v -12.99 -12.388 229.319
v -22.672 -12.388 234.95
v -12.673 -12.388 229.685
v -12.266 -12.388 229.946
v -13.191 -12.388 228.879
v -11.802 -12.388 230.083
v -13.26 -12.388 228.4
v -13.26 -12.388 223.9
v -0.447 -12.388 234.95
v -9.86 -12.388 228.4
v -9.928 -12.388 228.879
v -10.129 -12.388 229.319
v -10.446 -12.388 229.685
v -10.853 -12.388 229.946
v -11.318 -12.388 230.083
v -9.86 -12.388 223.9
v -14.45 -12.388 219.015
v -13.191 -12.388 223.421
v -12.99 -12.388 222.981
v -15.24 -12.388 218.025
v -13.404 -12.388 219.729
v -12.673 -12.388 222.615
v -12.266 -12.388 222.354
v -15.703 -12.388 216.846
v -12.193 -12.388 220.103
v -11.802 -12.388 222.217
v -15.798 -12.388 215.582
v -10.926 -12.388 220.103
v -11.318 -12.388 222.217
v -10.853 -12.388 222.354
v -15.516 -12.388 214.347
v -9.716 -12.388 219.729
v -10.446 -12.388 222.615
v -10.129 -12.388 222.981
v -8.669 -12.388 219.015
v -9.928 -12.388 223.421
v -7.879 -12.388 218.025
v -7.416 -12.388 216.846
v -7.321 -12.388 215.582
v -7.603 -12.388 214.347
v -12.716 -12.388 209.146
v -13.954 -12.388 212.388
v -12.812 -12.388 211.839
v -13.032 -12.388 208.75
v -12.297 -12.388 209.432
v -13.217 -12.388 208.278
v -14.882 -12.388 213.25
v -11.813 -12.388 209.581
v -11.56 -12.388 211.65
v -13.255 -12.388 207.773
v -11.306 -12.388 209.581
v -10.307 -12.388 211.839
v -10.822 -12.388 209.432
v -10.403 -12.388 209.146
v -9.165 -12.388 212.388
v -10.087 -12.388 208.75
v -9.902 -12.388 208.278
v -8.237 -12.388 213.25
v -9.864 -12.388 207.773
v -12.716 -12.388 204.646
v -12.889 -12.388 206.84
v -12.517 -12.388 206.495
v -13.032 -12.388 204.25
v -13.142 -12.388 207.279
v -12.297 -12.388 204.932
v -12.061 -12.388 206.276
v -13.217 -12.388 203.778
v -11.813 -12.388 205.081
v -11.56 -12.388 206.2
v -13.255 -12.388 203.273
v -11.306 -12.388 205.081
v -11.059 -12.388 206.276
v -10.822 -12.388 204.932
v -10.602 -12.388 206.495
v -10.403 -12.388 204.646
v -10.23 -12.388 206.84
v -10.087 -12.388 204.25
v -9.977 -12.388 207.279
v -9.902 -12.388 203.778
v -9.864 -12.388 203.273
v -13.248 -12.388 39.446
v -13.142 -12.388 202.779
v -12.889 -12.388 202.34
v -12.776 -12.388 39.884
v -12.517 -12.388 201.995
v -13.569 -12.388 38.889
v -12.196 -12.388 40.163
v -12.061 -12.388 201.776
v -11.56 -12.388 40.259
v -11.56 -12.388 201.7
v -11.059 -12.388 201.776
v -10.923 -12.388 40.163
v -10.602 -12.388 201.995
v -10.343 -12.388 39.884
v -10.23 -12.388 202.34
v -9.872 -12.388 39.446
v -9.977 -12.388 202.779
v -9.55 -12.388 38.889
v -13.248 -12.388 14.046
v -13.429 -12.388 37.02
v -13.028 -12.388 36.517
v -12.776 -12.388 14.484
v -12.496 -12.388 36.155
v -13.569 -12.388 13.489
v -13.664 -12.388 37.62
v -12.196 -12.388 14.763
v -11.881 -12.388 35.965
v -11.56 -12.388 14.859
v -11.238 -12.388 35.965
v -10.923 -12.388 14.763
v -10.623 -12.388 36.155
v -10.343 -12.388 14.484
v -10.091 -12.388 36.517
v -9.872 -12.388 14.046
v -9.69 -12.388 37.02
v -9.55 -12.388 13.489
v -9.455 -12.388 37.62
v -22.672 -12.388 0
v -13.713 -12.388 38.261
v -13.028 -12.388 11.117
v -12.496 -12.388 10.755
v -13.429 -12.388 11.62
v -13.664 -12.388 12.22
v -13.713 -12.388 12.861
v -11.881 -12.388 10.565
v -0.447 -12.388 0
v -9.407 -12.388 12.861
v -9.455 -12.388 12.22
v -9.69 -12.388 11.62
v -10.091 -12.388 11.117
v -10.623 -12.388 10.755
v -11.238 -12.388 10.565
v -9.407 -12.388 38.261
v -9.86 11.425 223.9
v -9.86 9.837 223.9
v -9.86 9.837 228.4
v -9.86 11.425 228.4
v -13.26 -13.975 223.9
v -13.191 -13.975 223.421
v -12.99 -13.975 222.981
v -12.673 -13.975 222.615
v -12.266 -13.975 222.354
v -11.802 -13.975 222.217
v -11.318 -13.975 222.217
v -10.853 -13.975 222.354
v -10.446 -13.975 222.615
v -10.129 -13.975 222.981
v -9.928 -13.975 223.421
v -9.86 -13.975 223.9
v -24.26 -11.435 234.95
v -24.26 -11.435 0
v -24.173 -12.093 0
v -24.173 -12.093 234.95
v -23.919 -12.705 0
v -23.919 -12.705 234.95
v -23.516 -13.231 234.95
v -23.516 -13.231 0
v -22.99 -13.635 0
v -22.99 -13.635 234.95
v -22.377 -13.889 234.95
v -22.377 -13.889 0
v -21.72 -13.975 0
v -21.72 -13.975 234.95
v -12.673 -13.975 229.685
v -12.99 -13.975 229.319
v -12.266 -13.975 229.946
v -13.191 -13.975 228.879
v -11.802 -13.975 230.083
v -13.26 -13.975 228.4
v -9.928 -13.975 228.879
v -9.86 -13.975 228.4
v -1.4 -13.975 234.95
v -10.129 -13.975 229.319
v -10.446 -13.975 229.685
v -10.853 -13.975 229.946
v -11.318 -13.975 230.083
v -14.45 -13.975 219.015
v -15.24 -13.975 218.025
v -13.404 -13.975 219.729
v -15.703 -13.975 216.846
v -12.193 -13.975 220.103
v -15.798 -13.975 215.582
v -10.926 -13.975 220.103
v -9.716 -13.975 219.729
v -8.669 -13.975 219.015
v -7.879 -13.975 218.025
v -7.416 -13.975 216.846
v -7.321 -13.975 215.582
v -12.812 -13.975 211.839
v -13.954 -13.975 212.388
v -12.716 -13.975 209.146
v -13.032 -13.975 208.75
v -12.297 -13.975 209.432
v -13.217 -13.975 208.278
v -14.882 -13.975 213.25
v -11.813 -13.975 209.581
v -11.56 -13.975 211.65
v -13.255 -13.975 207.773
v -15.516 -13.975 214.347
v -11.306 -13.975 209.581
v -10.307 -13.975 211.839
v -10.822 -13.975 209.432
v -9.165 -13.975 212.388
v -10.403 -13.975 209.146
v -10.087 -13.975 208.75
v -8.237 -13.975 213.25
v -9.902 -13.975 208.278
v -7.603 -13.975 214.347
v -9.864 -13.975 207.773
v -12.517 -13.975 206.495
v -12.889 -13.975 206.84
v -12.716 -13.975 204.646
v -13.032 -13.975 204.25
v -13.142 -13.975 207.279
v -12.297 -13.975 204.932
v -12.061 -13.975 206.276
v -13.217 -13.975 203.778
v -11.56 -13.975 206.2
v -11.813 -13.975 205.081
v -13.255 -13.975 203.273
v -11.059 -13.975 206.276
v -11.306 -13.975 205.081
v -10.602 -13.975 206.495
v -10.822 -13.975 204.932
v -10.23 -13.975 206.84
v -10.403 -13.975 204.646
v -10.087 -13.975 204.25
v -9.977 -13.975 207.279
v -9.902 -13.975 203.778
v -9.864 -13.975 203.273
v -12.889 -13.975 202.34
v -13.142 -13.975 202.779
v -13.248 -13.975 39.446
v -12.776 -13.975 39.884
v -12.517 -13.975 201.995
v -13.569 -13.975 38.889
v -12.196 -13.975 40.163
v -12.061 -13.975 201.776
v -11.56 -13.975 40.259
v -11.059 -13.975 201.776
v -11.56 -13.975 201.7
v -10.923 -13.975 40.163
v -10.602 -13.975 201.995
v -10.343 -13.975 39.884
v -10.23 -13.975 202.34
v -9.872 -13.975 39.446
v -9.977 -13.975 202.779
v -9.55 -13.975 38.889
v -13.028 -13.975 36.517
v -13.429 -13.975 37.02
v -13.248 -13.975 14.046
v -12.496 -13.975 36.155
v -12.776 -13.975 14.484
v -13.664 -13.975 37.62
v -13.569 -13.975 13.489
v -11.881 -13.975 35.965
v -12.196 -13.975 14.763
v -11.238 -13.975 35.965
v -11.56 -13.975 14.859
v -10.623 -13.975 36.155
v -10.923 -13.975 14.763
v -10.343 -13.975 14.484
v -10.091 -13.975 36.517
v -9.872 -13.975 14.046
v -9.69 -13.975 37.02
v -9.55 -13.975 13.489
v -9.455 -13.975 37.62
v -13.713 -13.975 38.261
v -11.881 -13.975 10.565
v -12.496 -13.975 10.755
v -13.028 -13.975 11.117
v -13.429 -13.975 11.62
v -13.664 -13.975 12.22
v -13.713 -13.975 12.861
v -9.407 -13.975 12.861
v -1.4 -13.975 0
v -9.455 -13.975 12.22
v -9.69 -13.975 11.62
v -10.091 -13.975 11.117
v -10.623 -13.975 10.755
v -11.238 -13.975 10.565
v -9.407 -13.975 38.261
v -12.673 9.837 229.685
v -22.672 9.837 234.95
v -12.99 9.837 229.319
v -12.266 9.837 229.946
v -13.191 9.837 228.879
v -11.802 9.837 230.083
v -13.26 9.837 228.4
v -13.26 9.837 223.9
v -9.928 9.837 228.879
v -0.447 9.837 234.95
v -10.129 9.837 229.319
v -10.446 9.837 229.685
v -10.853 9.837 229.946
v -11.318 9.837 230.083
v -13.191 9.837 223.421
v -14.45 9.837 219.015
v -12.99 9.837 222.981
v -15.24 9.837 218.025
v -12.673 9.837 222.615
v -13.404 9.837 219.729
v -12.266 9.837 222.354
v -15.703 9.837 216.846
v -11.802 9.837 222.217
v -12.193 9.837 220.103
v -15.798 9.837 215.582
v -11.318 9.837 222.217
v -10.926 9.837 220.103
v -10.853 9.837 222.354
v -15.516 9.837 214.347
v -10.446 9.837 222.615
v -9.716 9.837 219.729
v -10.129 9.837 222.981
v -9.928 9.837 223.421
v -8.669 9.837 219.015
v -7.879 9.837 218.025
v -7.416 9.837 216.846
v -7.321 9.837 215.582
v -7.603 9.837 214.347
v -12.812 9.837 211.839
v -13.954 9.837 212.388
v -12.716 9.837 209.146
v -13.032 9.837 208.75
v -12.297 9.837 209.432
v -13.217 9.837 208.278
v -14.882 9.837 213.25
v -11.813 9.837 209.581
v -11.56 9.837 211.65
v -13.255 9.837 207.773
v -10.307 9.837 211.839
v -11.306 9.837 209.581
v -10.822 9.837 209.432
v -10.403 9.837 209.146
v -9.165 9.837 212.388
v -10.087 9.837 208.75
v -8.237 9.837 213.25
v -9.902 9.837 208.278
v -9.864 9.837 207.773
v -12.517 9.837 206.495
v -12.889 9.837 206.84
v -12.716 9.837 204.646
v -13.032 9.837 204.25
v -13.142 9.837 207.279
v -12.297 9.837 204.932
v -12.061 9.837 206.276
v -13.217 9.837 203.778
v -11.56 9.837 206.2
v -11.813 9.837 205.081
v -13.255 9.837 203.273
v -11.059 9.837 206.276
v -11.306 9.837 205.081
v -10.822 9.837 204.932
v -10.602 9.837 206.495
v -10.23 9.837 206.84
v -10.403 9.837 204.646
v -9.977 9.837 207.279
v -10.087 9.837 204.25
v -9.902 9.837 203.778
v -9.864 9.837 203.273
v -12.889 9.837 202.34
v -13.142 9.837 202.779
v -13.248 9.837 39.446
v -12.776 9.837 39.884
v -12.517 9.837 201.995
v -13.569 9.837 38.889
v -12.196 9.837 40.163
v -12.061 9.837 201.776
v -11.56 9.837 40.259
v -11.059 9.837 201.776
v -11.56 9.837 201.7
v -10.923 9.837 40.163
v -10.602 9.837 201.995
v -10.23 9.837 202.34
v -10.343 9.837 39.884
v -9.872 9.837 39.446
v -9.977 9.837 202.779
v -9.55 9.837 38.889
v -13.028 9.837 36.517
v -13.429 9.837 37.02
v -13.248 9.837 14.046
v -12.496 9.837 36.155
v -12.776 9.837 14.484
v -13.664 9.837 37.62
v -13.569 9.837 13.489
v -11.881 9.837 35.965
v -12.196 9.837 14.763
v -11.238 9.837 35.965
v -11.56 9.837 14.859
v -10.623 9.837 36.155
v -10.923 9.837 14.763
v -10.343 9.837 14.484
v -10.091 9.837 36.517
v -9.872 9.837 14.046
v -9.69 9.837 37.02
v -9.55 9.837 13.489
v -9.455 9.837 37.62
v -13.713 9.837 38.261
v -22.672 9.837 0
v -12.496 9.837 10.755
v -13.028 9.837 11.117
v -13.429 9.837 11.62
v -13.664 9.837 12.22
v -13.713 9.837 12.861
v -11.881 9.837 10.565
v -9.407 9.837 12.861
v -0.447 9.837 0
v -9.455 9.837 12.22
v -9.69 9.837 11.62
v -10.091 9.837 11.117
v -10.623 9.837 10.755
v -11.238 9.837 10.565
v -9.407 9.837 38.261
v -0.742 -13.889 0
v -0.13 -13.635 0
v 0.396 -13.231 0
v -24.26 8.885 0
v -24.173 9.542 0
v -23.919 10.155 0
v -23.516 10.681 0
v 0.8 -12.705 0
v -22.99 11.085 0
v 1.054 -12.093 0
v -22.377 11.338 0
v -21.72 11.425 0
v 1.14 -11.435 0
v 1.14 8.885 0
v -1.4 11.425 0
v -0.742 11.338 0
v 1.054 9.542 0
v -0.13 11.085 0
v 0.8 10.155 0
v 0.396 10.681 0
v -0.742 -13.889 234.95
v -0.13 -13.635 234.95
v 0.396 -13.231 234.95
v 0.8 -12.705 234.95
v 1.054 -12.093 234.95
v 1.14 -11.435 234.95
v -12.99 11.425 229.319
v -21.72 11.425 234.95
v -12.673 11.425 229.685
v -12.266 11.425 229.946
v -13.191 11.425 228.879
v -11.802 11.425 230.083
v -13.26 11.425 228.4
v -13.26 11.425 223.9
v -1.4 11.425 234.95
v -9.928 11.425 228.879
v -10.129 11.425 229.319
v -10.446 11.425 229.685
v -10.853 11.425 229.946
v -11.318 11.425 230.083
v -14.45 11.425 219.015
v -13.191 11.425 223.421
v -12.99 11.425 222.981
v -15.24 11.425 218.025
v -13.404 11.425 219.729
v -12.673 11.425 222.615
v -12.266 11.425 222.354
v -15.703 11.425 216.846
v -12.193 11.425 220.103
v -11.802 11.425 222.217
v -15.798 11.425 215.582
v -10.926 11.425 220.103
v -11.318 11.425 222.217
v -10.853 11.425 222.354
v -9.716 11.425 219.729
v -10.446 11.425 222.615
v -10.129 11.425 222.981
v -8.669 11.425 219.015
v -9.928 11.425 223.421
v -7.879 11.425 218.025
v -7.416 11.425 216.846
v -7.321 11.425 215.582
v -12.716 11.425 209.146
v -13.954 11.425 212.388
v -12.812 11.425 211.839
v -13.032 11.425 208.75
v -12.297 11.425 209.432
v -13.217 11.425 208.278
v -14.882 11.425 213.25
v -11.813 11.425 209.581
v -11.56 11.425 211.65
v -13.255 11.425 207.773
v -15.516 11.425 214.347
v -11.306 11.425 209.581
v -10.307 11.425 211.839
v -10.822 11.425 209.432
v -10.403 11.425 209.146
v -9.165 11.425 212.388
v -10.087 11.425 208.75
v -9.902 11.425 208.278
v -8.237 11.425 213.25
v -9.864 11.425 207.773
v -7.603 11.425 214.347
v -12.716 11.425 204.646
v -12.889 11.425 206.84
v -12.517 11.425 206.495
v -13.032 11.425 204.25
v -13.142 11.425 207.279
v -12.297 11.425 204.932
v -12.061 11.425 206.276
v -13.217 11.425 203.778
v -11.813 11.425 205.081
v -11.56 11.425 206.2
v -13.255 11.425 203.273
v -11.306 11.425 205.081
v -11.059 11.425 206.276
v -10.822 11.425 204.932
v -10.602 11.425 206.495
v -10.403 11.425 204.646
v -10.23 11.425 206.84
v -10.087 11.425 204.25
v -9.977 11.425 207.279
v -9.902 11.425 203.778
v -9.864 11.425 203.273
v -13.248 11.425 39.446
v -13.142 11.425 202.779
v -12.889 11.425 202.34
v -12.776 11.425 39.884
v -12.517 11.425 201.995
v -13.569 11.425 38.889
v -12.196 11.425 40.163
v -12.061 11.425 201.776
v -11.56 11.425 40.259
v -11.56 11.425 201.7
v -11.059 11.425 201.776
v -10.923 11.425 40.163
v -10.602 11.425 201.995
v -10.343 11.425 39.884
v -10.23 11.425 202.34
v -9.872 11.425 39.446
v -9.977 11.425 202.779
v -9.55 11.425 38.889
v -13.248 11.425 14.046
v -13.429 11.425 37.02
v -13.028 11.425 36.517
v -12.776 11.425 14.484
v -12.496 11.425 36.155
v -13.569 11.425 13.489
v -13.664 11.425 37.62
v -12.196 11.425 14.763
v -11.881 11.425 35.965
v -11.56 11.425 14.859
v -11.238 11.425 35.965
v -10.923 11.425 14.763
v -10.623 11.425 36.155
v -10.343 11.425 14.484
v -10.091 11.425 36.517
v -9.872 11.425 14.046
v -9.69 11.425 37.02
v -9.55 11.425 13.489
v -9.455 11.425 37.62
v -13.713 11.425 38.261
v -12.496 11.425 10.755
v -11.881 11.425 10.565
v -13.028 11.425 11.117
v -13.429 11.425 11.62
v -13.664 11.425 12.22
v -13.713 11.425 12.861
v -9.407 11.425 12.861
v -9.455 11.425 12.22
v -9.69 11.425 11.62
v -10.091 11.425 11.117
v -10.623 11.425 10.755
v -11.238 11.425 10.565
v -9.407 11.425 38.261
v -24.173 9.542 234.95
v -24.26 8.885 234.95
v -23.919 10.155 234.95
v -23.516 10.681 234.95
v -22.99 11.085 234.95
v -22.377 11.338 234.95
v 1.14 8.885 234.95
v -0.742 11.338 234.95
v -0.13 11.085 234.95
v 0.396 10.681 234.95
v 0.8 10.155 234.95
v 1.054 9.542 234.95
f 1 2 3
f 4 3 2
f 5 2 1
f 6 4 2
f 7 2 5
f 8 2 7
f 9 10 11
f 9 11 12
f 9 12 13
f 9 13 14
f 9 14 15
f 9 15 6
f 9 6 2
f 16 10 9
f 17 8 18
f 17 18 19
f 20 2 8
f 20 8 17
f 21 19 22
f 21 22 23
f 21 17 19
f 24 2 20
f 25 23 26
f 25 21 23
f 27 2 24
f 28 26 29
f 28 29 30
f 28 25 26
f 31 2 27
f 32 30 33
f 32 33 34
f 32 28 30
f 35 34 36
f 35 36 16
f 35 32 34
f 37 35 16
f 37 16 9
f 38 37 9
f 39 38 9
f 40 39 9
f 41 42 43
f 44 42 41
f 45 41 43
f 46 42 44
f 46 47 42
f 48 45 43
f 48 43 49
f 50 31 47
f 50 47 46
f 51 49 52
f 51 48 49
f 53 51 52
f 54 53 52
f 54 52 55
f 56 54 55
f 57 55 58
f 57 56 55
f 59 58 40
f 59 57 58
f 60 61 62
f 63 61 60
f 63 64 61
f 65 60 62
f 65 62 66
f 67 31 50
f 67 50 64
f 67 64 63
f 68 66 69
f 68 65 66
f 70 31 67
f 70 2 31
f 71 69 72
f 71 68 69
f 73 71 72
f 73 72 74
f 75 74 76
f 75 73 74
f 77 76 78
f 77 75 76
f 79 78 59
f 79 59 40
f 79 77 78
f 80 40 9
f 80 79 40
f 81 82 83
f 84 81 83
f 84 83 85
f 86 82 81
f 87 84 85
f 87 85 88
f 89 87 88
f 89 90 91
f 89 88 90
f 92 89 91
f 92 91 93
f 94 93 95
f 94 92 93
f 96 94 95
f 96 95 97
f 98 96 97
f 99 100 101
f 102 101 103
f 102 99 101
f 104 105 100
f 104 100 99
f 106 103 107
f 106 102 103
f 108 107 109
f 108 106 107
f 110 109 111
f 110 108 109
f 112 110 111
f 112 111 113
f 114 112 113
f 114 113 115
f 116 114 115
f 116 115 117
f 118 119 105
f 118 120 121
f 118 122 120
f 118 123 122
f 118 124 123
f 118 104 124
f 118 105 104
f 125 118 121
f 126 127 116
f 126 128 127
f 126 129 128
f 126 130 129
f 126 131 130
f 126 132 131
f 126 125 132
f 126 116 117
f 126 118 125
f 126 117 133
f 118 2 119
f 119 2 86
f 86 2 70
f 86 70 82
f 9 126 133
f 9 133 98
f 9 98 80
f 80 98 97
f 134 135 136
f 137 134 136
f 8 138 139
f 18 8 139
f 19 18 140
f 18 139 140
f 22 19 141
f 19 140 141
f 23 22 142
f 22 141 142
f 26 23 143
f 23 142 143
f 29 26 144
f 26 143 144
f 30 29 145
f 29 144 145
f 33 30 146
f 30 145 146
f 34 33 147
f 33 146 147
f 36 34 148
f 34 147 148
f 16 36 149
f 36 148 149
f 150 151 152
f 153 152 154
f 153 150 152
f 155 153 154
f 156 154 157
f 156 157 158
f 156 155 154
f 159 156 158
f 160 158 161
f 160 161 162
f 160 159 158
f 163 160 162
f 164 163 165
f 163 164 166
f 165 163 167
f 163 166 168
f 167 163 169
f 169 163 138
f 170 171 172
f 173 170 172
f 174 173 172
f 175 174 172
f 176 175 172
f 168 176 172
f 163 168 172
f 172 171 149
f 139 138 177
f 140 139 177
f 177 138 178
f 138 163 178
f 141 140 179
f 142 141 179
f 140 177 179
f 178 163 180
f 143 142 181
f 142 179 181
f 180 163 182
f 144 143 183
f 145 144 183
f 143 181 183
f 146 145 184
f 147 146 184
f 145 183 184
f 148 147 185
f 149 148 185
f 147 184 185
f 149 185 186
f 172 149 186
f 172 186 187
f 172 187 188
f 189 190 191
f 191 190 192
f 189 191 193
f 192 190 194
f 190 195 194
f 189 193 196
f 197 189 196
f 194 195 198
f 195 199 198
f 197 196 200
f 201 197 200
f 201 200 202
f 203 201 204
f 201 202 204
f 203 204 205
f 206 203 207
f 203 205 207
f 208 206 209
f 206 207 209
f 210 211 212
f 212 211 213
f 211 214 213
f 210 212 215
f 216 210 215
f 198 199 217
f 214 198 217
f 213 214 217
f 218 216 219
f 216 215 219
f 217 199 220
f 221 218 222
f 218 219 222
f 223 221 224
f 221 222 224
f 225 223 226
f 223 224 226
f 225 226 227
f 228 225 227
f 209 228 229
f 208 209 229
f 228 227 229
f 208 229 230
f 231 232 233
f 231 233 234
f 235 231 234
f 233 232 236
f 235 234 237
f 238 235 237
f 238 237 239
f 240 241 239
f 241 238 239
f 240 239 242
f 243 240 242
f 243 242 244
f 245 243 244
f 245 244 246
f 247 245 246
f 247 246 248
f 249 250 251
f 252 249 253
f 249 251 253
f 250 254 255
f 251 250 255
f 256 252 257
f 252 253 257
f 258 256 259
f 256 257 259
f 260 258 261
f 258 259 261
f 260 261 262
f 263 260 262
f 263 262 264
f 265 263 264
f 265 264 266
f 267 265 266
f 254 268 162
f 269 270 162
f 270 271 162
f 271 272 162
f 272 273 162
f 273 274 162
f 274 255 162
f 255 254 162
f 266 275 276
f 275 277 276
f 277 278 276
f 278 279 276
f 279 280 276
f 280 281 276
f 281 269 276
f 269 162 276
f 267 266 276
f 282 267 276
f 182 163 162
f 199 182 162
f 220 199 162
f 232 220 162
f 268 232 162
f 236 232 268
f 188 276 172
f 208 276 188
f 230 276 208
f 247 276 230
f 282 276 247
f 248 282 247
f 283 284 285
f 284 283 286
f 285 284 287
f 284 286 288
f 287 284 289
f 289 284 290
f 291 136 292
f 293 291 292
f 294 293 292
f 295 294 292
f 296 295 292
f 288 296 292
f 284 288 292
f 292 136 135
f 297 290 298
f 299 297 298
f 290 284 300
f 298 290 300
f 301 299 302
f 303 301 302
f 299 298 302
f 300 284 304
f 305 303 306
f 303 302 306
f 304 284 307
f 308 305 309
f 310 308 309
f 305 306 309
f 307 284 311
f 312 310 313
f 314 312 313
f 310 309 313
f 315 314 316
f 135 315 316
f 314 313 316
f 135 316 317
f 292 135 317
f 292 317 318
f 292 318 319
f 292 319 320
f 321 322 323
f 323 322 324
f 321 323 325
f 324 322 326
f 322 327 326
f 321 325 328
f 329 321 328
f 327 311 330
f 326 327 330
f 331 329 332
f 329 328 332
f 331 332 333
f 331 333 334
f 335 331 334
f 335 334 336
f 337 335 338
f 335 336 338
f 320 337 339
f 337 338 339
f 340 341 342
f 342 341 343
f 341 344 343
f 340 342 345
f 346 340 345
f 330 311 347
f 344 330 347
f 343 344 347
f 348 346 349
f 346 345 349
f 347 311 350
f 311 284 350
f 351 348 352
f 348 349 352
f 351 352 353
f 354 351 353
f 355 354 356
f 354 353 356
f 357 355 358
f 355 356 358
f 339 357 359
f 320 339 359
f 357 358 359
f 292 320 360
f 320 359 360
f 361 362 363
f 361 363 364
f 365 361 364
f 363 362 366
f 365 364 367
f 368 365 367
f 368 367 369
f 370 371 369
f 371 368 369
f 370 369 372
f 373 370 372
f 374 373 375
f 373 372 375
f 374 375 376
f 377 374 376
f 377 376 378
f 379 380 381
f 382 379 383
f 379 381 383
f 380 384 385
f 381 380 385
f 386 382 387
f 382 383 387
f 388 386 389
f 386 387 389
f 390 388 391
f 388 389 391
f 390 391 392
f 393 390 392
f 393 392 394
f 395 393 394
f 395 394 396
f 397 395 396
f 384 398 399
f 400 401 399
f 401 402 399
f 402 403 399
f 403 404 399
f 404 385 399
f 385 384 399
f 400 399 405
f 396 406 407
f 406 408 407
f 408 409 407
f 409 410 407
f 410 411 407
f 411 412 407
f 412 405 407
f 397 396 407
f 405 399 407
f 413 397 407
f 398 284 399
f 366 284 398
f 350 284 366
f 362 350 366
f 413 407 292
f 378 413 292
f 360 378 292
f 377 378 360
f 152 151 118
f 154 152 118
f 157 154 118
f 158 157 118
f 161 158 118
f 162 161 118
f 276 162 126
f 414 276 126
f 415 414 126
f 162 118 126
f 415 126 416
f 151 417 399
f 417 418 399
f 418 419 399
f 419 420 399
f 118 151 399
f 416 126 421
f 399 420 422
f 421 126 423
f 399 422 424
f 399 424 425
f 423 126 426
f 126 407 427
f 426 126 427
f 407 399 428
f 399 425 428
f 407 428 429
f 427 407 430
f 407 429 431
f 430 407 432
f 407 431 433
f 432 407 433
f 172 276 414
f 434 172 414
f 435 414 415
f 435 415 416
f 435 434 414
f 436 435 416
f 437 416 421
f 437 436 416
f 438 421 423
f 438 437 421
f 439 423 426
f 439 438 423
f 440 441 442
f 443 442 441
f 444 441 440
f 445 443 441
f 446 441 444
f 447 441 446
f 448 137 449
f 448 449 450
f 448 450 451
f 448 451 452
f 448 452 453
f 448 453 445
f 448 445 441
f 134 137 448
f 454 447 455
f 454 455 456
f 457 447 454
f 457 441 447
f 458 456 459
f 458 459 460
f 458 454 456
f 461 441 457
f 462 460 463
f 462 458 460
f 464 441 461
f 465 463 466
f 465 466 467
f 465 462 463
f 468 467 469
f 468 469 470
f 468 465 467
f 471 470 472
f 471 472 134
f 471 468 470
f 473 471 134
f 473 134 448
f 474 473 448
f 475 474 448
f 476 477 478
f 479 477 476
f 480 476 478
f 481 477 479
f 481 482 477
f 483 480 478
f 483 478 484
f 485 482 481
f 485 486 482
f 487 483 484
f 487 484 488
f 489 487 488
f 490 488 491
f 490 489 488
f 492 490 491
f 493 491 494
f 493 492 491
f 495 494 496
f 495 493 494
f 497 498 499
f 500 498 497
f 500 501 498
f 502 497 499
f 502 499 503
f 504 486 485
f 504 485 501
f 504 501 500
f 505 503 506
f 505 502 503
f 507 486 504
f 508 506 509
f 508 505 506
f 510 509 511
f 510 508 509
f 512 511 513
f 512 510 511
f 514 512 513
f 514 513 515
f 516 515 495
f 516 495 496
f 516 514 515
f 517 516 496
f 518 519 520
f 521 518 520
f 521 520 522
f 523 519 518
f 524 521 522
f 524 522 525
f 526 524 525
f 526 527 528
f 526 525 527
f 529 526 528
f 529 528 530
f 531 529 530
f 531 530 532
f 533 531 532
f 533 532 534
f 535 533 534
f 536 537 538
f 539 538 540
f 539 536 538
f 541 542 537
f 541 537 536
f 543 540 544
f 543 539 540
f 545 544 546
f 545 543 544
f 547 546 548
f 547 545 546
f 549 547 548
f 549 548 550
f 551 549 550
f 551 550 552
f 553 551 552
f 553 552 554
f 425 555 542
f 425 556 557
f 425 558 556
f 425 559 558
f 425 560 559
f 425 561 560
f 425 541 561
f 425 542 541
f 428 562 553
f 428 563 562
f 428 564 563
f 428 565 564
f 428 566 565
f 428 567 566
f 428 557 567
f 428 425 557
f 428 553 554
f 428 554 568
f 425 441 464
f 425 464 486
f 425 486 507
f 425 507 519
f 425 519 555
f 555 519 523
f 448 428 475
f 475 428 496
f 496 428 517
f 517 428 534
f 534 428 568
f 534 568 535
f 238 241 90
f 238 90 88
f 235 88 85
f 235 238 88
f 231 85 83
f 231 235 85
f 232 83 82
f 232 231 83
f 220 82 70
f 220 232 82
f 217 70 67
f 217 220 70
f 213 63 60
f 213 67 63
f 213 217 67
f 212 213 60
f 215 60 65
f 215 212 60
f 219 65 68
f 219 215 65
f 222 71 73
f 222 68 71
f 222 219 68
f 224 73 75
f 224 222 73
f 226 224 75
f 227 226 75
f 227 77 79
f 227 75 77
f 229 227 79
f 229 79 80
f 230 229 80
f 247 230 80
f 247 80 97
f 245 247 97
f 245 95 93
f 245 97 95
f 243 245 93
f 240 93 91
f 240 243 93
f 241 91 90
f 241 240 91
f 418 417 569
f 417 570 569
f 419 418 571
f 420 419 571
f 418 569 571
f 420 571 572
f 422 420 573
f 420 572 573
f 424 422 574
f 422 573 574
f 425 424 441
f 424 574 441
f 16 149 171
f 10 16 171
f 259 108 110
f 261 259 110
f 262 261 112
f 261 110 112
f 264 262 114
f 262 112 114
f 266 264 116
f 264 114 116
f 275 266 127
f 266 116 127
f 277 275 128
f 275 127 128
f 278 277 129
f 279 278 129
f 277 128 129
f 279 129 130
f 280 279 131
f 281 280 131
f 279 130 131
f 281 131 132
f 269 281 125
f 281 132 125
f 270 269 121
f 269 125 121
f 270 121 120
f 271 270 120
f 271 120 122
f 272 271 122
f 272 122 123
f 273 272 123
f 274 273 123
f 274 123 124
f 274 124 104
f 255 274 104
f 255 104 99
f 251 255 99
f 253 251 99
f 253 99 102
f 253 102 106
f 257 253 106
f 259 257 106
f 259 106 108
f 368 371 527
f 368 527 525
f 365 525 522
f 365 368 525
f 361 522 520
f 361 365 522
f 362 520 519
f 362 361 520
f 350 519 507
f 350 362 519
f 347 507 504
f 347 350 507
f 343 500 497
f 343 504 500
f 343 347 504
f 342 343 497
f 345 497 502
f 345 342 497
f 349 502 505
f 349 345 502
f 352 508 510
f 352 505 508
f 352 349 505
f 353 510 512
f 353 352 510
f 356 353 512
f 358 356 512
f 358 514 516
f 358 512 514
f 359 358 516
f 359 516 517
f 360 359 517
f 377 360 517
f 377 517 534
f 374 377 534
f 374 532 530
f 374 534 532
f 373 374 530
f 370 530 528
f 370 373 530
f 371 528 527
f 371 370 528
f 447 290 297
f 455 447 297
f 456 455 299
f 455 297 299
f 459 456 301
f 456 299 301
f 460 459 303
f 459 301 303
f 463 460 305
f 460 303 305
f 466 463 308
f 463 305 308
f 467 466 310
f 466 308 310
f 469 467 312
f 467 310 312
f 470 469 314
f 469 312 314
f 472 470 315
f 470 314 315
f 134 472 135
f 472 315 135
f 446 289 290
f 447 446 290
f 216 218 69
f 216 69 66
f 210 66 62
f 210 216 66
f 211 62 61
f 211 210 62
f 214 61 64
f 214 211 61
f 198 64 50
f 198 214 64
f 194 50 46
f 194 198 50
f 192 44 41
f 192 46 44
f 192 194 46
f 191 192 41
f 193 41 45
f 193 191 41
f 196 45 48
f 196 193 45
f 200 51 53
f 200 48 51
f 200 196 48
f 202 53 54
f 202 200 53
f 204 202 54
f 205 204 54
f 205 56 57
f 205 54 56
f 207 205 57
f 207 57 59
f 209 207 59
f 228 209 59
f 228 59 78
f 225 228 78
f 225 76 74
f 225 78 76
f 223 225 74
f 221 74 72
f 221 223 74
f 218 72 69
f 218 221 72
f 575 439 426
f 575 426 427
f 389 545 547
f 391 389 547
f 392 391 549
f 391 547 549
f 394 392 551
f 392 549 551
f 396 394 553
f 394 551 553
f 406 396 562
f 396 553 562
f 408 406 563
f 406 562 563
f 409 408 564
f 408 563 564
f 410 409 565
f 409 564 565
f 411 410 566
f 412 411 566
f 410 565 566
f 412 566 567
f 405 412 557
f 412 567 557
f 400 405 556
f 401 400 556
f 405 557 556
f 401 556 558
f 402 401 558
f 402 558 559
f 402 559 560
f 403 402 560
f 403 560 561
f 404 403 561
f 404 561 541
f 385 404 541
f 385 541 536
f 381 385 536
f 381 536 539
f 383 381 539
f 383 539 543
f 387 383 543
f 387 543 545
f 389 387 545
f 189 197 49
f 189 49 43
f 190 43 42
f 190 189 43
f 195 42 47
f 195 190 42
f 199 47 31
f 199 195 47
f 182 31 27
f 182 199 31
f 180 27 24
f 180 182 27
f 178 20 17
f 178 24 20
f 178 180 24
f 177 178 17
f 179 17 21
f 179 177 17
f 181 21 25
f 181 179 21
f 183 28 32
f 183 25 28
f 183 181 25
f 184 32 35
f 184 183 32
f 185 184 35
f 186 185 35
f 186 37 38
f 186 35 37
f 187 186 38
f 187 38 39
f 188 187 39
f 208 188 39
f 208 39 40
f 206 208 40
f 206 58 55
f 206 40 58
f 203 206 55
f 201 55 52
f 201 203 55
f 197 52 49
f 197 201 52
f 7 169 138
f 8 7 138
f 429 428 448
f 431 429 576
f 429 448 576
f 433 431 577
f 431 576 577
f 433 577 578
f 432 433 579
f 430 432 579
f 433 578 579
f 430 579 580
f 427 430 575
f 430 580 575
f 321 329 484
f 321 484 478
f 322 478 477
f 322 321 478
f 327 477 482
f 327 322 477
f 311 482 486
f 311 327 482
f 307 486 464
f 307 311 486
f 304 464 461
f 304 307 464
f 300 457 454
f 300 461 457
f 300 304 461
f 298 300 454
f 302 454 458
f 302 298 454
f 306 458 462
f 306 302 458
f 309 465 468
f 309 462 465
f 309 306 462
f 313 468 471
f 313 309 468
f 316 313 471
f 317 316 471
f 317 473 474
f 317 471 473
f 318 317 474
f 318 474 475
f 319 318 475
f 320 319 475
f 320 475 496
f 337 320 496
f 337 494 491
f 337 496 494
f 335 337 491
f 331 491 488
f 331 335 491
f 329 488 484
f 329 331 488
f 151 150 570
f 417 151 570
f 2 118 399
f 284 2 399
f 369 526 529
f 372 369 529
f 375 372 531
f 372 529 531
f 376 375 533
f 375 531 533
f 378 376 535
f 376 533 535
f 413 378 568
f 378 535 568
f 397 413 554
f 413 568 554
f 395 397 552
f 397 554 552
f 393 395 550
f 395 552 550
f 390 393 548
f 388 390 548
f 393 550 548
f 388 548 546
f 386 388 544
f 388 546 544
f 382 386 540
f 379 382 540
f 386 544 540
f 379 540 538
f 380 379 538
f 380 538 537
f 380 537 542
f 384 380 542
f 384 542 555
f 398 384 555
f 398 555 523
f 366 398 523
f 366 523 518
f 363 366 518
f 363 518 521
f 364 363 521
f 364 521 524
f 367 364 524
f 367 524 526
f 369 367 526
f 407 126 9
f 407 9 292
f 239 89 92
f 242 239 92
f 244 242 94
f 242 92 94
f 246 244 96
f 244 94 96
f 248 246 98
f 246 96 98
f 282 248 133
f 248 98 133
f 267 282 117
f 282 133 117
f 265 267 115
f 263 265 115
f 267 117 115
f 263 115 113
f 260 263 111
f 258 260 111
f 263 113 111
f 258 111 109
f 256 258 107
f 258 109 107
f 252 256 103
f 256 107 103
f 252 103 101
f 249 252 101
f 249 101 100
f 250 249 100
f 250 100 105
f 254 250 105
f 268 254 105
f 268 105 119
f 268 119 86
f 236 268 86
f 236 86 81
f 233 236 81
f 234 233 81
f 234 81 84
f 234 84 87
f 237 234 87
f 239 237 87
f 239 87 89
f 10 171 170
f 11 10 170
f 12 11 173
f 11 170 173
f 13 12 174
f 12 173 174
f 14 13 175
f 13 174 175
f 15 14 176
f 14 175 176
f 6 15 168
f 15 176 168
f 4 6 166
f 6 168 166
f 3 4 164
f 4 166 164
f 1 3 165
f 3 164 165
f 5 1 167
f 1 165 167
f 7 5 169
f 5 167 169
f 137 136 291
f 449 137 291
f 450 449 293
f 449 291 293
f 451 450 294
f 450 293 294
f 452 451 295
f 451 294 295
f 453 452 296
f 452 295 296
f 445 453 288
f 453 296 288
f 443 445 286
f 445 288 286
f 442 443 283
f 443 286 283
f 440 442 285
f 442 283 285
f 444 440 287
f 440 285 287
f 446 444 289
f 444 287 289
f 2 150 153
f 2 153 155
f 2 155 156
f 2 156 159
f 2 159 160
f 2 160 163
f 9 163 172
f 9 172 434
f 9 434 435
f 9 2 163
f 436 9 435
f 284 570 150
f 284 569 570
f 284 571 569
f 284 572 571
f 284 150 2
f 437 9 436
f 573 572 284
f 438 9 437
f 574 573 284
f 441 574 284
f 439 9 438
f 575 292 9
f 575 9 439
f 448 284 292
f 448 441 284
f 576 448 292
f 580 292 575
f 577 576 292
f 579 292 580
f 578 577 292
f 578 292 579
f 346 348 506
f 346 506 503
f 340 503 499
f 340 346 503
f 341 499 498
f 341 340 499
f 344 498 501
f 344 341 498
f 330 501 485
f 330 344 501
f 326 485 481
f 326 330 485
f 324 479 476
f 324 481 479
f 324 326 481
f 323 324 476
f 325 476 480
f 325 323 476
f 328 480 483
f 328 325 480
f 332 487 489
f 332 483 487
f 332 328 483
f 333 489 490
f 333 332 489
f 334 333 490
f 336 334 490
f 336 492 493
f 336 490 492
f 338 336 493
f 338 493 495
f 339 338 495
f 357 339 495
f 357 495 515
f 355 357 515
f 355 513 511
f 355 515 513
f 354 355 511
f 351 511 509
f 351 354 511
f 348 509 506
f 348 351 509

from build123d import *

# Parameters (mm, degrees)
SKETCH1_W               = 25.4
SKETCH1_H               = 25.4
SKETCH1_W_2             = 22.225
SKETCH1_H_2             = 22.225
BOSS_EXTRUDE1_DEPTH     = 234.95
FILLET1_R               = 2.54
SKETCH2_R               = 2.159
CUT_EXTRUDE1_DEPTH      = 238.560919126
CUT_EXTRUDE2_DEPTH      = 238.560919126
CUT_EXTRUDE2_DEPTH_BACK = 238.560919126
SKETCH3_R               = 1.7
SKETCH3_R_2             = 4.25


with BuildPart() as part:
    # Sketch1 → Boss-Extrude1 (new body)
    with BuildSketch(Plane.XY):
        with Locations((-11.559591837, -1.275183673)):
            Rectangle(SKETCH1_W, SKETCH1_H)
        with Locations((-11.559591837, -1.275183673)):
            Rectangle(SKETCH1_W_2, SKETCH1_H_2, mode=Mode.SUBTRACT)
    extrude(amount=BOSS_EXTRUDE1_DEPTH)

    # Fillet1
    fillet1_edges = [part.edges().sort_by_distance(p)[0] for p in [
        (-24.259591837, 11.424816327, 117.475),
        (1.140408163, 11.424816327, 117.475),
        (1.140408163, -13.975183673, 117.475),
        (-24.259591837, -13.975183673, 117.475),
    ]]
    fillet(fillet1_edges, radius=FILLET1_R)

    # Sketch2 → Cut-Extrude1 (cut, through all)
    with BuildSketch(Plane(origin=(0, 11.424816327, 0), x_dir=(1, 0, 0), z_dir=(0, 1, 0))):
        with Locations(Location((-11.559591837, -12.7, 0), (0, 0, 270))):
            Circle(SKETCH2_R)
        with Locations(Location((-11.559591837, -38.1, 0), (0, 0, 270))):
            Circle(SKETCH2_R)
    extrude(amount=-CUT_EXTRUDE1_DEPTH, mode=Mode.SUBTRACT)

    # Sketch3 → Cut-Extrude2 (cut, two sides: drawn at the far end of the back side and taken through both)
    with BuildSketch(Plane(origin=(0, 11.424816327, 0), x_dir=(1, 0, 0), z_dir=(0, 1, 0)).offset(-CUT_EXTRUDE2_DEPTH_BACK)):
        with Locations(Location((-11.559591837, -207.9, 0), (0, 0, 90))):
            Circle(SKETCH3_R)
        with Locations(Location((-11.559591837, -203.4, 0), (0, 0, 90))):
            Circle(SKETCH3_R)
        with Locations(Location((-11.559591837, -215.9, 0), (0, 0, 90))):
            Circle(SKETCH3_R_2)
        with BuildLine():
            Line((-9.859591837, -223.9), (-9.859591837, -228.4))
            ThreePointArc((-9.859591837, -228.4), (-11.559591837, -230.1), (-13.259591837, -228.4))
            Line((-13.259591837, -228.4), (-13.259591837, -223.9))
            ThreePointArc((-13.259591837, -223.9), (-11.559591837, -222.2), (-9.859591837, -223.9))
        make_face()
    extrude(amount=CUT_EXTRUDE2_DEPTH + CUT_EXTRUDE2_DEPTH_BACK, mode=Mode.SUBTRACT)


solid = part.part
